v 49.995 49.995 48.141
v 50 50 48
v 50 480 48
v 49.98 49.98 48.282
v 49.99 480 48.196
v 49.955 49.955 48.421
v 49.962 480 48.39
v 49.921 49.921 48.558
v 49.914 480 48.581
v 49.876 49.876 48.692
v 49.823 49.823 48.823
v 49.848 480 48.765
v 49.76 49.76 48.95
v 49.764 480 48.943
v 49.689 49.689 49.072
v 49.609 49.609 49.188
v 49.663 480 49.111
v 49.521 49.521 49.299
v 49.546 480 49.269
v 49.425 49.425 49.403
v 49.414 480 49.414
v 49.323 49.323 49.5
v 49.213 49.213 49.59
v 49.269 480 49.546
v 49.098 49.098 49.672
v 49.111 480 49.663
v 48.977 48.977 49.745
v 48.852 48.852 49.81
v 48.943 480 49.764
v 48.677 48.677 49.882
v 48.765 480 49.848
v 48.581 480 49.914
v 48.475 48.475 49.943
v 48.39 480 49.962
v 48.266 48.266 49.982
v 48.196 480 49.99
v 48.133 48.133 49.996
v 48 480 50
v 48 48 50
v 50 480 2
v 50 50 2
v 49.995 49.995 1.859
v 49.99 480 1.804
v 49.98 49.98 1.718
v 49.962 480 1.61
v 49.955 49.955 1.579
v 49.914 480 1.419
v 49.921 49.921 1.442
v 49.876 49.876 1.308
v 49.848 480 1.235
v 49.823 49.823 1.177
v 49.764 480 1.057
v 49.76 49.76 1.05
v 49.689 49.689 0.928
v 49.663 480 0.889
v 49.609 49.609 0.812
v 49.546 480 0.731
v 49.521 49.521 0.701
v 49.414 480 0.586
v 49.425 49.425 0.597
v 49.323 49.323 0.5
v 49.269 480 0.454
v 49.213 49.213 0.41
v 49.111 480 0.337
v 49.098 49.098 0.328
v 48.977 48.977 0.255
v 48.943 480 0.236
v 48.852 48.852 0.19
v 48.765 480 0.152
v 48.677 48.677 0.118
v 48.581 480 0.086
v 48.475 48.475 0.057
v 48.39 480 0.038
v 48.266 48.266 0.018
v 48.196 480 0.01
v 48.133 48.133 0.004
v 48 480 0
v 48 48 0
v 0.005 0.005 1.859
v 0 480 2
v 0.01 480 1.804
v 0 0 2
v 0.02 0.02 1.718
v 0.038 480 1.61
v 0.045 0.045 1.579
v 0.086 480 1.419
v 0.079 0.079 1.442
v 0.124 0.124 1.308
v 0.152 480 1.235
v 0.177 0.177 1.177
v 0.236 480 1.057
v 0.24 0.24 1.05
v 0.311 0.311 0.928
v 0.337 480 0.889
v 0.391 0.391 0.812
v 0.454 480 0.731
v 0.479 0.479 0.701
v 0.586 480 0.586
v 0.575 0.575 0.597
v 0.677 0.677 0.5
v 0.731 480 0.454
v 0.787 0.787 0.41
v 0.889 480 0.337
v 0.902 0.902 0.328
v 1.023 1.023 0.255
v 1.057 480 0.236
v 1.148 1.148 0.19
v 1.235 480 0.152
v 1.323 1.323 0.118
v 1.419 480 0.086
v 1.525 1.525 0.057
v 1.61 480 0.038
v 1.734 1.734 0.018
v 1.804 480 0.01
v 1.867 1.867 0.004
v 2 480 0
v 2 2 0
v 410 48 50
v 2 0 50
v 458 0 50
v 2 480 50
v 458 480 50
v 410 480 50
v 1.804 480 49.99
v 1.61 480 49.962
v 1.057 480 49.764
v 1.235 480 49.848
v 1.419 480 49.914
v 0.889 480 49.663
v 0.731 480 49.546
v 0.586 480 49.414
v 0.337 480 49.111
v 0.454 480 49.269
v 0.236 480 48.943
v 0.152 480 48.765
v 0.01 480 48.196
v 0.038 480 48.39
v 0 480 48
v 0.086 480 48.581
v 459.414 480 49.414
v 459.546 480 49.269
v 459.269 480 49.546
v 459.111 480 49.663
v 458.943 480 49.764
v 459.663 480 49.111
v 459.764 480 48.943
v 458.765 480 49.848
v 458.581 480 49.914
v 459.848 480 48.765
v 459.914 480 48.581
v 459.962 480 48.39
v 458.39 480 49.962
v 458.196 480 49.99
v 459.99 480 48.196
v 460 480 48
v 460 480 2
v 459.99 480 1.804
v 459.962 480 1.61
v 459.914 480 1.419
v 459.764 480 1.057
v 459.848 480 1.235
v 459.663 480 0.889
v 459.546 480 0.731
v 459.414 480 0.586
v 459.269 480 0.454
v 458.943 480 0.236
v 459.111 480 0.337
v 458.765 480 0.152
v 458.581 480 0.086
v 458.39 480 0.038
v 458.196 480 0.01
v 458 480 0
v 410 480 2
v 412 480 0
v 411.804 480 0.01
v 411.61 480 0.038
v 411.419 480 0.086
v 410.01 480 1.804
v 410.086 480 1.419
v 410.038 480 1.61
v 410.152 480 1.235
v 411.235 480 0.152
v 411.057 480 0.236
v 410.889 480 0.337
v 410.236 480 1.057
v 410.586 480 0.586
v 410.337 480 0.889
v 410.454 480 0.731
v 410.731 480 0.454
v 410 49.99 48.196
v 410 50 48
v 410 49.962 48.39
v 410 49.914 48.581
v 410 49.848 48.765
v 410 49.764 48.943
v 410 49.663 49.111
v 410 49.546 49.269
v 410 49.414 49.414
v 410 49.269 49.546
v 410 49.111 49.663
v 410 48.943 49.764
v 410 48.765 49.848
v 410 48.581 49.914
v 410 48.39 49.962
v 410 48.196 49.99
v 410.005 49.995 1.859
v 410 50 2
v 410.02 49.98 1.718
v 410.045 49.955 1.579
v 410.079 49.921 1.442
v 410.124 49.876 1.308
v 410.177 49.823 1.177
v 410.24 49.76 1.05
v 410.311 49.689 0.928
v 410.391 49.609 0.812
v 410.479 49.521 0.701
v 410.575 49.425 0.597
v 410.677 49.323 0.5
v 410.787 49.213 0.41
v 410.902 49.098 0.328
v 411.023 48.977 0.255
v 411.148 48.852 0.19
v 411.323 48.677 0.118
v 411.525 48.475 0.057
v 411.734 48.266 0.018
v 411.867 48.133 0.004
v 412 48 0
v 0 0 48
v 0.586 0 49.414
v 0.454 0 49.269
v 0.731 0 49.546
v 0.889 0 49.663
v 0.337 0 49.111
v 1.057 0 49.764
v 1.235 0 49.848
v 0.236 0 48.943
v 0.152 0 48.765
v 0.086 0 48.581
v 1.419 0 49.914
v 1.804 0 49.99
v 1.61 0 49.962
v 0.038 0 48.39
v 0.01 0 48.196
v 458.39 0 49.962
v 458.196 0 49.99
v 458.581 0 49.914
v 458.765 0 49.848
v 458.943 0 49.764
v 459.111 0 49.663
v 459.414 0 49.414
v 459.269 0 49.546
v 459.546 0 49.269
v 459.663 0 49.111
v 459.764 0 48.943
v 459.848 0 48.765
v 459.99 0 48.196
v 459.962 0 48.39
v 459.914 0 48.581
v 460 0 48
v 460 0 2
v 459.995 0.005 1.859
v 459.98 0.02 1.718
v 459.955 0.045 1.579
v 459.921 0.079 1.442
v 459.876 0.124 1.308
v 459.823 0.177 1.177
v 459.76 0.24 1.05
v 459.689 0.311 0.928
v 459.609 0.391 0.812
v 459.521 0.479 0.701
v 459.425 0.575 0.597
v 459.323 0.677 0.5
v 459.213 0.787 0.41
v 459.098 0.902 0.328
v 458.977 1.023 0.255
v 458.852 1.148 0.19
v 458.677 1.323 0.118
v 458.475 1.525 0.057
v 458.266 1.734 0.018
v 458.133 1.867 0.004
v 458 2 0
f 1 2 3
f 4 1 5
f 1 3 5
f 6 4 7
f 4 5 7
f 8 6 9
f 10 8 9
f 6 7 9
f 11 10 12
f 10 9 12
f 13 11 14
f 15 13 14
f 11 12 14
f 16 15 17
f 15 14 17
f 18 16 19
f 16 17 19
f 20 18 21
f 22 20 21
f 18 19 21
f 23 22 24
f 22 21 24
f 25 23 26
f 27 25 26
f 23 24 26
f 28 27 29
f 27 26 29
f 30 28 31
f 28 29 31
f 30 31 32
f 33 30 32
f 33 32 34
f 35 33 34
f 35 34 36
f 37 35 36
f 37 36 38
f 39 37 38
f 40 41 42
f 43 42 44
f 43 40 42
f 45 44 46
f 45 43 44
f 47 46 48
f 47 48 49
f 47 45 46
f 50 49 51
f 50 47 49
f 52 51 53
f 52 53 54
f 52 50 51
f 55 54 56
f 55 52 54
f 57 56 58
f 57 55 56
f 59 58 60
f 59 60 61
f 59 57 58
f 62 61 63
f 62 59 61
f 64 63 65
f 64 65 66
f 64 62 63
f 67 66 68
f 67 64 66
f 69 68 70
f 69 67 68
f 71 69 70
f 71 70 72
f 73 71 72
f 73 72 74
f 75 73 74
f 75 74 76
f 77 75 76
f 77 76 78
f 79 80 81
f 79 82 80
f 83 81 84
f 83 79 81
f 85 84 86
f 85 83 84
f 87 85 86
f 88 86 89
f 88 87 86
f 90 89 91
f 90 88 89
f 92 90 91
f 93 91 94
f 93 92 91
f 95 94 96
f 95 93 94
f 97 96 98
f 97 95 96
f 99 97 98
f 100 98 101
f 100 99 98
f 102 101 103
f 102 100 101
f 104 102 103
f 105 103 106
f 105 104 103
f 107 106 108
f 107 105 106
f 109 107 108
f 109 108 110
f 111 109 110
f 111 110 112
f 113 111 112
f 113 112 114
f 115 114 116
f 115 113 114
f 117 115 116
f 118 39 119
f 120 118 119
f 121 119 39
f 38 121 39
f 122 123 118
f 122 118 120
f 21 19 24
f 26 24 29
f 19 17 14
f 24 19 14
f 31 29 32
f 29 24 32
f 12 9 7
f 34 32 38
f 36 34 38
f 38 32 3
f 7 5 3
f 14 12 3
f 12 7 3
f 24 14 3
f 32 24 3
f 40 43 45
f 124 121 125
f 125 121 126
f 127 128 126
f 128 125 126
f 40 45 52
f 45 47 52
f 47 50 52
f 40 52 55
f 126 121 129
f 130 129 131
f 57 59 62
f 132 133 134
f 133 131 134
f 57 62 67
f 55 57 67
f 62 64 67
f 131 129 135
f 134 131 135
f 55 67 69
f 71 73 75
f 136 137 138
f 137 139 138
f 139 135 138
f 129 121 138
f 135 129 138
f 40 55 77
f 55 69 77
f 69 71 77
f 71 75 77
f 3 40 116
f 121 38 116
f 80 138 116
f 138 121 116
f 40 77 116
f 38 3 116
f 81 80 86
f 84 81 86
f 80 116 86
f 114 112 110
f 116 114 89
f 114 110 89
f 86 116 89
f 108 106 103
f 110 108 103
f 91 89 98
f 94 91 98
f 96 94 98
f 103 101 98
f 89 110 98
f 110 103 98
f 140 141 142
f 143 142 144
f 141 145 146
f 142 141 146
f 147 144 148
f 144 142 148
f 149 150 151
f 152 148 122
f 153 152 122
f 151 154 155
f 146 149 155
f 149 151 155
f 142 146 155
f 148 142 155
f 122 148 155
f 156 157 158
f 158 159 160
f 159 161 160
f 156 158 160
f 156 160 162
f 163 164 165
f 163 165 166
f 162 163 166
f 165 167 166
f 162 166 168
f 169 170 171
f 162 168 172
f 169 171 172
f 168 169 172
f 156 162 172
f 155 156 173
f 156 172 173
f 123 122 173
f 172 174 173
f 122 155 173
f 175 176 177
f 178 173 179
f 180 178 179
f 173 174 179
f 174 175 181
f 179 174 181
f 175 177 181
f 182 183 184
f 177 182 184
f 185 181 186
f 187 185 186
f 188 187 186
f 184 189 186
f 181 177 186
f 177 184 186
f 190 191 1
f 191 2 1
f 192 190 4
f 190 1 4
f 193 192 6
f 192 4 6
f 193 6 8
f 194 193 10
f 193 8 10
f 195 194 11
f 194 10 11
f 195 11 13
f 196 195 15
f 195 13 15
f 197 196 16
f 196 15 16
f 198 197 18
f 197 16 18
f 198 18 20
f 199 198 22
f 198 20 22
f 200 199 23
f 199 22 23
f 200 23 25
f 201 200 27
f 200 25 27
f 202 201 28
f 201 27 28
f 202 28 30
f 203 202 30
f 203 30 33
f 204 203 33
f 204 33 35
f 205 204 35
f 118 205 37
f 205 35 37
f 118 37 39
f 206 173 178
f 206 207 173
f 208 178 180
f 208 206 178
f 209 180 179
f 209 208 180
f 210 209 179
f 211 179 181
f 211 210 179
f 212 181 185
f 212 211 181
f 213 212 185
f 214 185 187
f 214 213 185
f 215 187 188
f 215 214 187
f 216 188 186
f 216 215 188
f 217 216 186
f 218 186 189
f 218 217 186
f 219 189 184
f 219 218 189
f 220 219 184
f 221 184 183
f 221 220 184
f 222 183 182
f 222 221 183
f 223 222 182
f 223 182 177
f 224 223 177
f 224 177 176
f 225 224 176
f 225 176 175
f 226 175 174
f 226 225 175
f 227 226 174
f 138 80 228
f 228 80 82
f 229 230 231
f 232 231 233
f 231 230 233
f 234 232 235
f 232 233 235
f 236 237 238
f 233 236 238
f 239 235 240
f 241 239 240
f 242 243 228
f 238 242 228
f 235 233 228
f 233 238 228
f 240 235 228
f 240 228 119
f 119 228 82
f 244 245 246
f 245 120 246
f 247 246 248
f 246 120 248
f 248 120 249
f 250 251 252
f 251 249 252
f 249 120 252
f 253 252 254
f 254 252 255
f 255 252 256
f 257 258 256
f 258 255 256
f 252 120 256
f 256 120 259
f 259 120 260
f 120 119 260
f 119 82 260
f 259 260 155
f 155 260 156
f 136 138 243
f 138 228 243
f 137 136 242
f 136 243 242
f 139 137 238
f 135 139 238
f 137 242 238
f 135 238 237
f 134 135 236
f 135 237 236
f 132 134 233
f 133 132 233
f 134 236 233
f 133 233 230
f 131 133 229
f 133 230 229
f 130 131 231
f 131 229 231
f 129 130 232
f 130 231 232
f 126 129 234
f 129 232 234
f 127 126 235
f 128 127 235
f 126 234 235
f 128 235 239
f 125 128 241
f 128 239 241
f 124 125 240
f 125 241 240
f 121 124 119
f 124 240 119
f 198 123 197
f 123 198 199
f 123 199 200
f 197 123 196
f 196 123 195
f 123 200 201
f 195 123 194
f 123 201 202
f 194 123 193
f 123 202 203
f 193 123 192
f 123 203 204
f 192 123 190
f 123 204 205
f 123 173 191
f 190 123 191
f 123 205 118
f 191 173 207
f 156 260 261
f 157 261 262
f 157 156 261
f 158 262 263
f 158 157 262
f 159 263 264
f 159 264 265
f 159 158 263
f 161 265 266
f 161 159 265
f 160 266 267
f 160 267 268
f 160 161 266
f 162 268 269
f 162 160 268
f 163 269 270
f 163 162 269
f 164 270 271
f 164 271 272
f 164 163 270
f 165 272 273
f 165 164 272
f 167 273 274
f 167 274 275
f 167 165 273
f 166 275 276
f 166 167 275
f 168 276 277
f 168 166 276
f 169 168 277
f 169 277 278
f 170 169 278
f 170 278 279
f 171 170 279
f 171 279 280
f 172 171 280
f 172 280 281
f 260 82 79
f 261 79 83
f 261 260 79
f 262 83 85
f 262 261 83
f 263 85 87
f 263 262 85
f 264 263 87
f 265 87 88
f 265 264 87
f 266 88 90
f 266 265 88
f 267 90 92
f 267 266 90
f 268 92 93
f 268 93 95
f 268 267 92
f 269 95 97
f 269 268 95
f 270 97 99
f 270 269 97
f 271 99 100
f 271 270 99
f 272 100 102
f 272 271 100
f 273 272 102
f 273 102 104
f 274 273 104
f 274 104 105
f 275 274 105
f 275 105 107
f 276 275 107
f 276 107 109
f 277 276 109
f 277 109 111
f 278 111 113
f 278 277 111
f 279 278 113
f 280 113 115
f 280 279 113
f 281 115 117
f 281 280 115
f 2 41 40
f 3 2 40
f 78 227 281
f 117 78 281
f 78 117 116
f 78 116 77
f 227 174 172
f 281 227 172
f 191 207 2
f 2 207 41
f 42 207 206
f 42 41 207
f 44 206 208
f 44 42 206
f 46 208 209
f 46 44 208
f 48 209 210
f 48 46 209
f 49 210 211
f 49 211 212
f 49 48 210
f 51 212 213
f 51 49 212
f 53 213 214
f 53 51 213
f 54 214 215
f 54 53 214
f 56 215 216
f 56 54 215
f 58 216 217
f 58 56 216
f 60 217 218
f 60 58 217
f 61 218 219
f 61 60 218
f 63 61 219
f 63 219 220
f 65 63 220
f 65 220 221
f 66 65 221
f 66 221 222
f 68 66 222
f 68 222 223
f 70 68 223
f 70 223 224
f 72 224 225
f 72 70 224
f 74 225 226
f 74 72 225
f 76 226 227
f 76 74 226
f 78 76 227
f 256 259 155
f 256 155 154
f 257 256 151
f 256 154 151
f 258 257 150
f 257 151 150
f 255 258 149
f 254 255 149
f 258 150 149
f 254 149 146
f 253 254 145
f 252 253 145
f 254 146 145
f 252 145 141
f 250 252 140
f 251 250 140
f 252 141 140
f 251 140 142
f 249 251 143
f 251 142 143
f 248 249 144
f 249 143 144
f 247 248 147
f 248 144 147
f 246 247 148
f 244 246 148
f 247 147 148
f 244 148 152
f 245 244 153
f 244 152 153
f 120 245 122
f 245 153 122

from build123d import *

# Parameters (mm, degrees)
BOSS_EXTRUDE1_DEPTH = 50
FILLET1_R           = 2


with BuildPart() as part:
    # Sketch1 → Boss-Extrude1 (new body)
    with BuildSketch(Plane.XY):
        Polygon((410, 480), (410, 50), (50, 50), (50, 480), (0, 480), (0, 50), (0, 0), (460, 0), (460, 50), (460, 480), align=None)
    extrude(amount=BOSS_EXTRUDE1_DEPTH)

    # Fillet1
    fillet1_edges = [part.edges().sort_by_distance(p)[0] for p in [
        (460, 240, 0),
        (230, 0, 0),
        (0, 240, 0),
        (50, 265, 0),
        (0, 240, 50),
        (460, 240, 50),
        (230, 50, 50),
        (50, 265, 50),
        (230, 50, 0),
        (410, 265, 0),
    ]]
    fillet(fillet1_edges, radius=FILLET1_R)


solid = part.part
